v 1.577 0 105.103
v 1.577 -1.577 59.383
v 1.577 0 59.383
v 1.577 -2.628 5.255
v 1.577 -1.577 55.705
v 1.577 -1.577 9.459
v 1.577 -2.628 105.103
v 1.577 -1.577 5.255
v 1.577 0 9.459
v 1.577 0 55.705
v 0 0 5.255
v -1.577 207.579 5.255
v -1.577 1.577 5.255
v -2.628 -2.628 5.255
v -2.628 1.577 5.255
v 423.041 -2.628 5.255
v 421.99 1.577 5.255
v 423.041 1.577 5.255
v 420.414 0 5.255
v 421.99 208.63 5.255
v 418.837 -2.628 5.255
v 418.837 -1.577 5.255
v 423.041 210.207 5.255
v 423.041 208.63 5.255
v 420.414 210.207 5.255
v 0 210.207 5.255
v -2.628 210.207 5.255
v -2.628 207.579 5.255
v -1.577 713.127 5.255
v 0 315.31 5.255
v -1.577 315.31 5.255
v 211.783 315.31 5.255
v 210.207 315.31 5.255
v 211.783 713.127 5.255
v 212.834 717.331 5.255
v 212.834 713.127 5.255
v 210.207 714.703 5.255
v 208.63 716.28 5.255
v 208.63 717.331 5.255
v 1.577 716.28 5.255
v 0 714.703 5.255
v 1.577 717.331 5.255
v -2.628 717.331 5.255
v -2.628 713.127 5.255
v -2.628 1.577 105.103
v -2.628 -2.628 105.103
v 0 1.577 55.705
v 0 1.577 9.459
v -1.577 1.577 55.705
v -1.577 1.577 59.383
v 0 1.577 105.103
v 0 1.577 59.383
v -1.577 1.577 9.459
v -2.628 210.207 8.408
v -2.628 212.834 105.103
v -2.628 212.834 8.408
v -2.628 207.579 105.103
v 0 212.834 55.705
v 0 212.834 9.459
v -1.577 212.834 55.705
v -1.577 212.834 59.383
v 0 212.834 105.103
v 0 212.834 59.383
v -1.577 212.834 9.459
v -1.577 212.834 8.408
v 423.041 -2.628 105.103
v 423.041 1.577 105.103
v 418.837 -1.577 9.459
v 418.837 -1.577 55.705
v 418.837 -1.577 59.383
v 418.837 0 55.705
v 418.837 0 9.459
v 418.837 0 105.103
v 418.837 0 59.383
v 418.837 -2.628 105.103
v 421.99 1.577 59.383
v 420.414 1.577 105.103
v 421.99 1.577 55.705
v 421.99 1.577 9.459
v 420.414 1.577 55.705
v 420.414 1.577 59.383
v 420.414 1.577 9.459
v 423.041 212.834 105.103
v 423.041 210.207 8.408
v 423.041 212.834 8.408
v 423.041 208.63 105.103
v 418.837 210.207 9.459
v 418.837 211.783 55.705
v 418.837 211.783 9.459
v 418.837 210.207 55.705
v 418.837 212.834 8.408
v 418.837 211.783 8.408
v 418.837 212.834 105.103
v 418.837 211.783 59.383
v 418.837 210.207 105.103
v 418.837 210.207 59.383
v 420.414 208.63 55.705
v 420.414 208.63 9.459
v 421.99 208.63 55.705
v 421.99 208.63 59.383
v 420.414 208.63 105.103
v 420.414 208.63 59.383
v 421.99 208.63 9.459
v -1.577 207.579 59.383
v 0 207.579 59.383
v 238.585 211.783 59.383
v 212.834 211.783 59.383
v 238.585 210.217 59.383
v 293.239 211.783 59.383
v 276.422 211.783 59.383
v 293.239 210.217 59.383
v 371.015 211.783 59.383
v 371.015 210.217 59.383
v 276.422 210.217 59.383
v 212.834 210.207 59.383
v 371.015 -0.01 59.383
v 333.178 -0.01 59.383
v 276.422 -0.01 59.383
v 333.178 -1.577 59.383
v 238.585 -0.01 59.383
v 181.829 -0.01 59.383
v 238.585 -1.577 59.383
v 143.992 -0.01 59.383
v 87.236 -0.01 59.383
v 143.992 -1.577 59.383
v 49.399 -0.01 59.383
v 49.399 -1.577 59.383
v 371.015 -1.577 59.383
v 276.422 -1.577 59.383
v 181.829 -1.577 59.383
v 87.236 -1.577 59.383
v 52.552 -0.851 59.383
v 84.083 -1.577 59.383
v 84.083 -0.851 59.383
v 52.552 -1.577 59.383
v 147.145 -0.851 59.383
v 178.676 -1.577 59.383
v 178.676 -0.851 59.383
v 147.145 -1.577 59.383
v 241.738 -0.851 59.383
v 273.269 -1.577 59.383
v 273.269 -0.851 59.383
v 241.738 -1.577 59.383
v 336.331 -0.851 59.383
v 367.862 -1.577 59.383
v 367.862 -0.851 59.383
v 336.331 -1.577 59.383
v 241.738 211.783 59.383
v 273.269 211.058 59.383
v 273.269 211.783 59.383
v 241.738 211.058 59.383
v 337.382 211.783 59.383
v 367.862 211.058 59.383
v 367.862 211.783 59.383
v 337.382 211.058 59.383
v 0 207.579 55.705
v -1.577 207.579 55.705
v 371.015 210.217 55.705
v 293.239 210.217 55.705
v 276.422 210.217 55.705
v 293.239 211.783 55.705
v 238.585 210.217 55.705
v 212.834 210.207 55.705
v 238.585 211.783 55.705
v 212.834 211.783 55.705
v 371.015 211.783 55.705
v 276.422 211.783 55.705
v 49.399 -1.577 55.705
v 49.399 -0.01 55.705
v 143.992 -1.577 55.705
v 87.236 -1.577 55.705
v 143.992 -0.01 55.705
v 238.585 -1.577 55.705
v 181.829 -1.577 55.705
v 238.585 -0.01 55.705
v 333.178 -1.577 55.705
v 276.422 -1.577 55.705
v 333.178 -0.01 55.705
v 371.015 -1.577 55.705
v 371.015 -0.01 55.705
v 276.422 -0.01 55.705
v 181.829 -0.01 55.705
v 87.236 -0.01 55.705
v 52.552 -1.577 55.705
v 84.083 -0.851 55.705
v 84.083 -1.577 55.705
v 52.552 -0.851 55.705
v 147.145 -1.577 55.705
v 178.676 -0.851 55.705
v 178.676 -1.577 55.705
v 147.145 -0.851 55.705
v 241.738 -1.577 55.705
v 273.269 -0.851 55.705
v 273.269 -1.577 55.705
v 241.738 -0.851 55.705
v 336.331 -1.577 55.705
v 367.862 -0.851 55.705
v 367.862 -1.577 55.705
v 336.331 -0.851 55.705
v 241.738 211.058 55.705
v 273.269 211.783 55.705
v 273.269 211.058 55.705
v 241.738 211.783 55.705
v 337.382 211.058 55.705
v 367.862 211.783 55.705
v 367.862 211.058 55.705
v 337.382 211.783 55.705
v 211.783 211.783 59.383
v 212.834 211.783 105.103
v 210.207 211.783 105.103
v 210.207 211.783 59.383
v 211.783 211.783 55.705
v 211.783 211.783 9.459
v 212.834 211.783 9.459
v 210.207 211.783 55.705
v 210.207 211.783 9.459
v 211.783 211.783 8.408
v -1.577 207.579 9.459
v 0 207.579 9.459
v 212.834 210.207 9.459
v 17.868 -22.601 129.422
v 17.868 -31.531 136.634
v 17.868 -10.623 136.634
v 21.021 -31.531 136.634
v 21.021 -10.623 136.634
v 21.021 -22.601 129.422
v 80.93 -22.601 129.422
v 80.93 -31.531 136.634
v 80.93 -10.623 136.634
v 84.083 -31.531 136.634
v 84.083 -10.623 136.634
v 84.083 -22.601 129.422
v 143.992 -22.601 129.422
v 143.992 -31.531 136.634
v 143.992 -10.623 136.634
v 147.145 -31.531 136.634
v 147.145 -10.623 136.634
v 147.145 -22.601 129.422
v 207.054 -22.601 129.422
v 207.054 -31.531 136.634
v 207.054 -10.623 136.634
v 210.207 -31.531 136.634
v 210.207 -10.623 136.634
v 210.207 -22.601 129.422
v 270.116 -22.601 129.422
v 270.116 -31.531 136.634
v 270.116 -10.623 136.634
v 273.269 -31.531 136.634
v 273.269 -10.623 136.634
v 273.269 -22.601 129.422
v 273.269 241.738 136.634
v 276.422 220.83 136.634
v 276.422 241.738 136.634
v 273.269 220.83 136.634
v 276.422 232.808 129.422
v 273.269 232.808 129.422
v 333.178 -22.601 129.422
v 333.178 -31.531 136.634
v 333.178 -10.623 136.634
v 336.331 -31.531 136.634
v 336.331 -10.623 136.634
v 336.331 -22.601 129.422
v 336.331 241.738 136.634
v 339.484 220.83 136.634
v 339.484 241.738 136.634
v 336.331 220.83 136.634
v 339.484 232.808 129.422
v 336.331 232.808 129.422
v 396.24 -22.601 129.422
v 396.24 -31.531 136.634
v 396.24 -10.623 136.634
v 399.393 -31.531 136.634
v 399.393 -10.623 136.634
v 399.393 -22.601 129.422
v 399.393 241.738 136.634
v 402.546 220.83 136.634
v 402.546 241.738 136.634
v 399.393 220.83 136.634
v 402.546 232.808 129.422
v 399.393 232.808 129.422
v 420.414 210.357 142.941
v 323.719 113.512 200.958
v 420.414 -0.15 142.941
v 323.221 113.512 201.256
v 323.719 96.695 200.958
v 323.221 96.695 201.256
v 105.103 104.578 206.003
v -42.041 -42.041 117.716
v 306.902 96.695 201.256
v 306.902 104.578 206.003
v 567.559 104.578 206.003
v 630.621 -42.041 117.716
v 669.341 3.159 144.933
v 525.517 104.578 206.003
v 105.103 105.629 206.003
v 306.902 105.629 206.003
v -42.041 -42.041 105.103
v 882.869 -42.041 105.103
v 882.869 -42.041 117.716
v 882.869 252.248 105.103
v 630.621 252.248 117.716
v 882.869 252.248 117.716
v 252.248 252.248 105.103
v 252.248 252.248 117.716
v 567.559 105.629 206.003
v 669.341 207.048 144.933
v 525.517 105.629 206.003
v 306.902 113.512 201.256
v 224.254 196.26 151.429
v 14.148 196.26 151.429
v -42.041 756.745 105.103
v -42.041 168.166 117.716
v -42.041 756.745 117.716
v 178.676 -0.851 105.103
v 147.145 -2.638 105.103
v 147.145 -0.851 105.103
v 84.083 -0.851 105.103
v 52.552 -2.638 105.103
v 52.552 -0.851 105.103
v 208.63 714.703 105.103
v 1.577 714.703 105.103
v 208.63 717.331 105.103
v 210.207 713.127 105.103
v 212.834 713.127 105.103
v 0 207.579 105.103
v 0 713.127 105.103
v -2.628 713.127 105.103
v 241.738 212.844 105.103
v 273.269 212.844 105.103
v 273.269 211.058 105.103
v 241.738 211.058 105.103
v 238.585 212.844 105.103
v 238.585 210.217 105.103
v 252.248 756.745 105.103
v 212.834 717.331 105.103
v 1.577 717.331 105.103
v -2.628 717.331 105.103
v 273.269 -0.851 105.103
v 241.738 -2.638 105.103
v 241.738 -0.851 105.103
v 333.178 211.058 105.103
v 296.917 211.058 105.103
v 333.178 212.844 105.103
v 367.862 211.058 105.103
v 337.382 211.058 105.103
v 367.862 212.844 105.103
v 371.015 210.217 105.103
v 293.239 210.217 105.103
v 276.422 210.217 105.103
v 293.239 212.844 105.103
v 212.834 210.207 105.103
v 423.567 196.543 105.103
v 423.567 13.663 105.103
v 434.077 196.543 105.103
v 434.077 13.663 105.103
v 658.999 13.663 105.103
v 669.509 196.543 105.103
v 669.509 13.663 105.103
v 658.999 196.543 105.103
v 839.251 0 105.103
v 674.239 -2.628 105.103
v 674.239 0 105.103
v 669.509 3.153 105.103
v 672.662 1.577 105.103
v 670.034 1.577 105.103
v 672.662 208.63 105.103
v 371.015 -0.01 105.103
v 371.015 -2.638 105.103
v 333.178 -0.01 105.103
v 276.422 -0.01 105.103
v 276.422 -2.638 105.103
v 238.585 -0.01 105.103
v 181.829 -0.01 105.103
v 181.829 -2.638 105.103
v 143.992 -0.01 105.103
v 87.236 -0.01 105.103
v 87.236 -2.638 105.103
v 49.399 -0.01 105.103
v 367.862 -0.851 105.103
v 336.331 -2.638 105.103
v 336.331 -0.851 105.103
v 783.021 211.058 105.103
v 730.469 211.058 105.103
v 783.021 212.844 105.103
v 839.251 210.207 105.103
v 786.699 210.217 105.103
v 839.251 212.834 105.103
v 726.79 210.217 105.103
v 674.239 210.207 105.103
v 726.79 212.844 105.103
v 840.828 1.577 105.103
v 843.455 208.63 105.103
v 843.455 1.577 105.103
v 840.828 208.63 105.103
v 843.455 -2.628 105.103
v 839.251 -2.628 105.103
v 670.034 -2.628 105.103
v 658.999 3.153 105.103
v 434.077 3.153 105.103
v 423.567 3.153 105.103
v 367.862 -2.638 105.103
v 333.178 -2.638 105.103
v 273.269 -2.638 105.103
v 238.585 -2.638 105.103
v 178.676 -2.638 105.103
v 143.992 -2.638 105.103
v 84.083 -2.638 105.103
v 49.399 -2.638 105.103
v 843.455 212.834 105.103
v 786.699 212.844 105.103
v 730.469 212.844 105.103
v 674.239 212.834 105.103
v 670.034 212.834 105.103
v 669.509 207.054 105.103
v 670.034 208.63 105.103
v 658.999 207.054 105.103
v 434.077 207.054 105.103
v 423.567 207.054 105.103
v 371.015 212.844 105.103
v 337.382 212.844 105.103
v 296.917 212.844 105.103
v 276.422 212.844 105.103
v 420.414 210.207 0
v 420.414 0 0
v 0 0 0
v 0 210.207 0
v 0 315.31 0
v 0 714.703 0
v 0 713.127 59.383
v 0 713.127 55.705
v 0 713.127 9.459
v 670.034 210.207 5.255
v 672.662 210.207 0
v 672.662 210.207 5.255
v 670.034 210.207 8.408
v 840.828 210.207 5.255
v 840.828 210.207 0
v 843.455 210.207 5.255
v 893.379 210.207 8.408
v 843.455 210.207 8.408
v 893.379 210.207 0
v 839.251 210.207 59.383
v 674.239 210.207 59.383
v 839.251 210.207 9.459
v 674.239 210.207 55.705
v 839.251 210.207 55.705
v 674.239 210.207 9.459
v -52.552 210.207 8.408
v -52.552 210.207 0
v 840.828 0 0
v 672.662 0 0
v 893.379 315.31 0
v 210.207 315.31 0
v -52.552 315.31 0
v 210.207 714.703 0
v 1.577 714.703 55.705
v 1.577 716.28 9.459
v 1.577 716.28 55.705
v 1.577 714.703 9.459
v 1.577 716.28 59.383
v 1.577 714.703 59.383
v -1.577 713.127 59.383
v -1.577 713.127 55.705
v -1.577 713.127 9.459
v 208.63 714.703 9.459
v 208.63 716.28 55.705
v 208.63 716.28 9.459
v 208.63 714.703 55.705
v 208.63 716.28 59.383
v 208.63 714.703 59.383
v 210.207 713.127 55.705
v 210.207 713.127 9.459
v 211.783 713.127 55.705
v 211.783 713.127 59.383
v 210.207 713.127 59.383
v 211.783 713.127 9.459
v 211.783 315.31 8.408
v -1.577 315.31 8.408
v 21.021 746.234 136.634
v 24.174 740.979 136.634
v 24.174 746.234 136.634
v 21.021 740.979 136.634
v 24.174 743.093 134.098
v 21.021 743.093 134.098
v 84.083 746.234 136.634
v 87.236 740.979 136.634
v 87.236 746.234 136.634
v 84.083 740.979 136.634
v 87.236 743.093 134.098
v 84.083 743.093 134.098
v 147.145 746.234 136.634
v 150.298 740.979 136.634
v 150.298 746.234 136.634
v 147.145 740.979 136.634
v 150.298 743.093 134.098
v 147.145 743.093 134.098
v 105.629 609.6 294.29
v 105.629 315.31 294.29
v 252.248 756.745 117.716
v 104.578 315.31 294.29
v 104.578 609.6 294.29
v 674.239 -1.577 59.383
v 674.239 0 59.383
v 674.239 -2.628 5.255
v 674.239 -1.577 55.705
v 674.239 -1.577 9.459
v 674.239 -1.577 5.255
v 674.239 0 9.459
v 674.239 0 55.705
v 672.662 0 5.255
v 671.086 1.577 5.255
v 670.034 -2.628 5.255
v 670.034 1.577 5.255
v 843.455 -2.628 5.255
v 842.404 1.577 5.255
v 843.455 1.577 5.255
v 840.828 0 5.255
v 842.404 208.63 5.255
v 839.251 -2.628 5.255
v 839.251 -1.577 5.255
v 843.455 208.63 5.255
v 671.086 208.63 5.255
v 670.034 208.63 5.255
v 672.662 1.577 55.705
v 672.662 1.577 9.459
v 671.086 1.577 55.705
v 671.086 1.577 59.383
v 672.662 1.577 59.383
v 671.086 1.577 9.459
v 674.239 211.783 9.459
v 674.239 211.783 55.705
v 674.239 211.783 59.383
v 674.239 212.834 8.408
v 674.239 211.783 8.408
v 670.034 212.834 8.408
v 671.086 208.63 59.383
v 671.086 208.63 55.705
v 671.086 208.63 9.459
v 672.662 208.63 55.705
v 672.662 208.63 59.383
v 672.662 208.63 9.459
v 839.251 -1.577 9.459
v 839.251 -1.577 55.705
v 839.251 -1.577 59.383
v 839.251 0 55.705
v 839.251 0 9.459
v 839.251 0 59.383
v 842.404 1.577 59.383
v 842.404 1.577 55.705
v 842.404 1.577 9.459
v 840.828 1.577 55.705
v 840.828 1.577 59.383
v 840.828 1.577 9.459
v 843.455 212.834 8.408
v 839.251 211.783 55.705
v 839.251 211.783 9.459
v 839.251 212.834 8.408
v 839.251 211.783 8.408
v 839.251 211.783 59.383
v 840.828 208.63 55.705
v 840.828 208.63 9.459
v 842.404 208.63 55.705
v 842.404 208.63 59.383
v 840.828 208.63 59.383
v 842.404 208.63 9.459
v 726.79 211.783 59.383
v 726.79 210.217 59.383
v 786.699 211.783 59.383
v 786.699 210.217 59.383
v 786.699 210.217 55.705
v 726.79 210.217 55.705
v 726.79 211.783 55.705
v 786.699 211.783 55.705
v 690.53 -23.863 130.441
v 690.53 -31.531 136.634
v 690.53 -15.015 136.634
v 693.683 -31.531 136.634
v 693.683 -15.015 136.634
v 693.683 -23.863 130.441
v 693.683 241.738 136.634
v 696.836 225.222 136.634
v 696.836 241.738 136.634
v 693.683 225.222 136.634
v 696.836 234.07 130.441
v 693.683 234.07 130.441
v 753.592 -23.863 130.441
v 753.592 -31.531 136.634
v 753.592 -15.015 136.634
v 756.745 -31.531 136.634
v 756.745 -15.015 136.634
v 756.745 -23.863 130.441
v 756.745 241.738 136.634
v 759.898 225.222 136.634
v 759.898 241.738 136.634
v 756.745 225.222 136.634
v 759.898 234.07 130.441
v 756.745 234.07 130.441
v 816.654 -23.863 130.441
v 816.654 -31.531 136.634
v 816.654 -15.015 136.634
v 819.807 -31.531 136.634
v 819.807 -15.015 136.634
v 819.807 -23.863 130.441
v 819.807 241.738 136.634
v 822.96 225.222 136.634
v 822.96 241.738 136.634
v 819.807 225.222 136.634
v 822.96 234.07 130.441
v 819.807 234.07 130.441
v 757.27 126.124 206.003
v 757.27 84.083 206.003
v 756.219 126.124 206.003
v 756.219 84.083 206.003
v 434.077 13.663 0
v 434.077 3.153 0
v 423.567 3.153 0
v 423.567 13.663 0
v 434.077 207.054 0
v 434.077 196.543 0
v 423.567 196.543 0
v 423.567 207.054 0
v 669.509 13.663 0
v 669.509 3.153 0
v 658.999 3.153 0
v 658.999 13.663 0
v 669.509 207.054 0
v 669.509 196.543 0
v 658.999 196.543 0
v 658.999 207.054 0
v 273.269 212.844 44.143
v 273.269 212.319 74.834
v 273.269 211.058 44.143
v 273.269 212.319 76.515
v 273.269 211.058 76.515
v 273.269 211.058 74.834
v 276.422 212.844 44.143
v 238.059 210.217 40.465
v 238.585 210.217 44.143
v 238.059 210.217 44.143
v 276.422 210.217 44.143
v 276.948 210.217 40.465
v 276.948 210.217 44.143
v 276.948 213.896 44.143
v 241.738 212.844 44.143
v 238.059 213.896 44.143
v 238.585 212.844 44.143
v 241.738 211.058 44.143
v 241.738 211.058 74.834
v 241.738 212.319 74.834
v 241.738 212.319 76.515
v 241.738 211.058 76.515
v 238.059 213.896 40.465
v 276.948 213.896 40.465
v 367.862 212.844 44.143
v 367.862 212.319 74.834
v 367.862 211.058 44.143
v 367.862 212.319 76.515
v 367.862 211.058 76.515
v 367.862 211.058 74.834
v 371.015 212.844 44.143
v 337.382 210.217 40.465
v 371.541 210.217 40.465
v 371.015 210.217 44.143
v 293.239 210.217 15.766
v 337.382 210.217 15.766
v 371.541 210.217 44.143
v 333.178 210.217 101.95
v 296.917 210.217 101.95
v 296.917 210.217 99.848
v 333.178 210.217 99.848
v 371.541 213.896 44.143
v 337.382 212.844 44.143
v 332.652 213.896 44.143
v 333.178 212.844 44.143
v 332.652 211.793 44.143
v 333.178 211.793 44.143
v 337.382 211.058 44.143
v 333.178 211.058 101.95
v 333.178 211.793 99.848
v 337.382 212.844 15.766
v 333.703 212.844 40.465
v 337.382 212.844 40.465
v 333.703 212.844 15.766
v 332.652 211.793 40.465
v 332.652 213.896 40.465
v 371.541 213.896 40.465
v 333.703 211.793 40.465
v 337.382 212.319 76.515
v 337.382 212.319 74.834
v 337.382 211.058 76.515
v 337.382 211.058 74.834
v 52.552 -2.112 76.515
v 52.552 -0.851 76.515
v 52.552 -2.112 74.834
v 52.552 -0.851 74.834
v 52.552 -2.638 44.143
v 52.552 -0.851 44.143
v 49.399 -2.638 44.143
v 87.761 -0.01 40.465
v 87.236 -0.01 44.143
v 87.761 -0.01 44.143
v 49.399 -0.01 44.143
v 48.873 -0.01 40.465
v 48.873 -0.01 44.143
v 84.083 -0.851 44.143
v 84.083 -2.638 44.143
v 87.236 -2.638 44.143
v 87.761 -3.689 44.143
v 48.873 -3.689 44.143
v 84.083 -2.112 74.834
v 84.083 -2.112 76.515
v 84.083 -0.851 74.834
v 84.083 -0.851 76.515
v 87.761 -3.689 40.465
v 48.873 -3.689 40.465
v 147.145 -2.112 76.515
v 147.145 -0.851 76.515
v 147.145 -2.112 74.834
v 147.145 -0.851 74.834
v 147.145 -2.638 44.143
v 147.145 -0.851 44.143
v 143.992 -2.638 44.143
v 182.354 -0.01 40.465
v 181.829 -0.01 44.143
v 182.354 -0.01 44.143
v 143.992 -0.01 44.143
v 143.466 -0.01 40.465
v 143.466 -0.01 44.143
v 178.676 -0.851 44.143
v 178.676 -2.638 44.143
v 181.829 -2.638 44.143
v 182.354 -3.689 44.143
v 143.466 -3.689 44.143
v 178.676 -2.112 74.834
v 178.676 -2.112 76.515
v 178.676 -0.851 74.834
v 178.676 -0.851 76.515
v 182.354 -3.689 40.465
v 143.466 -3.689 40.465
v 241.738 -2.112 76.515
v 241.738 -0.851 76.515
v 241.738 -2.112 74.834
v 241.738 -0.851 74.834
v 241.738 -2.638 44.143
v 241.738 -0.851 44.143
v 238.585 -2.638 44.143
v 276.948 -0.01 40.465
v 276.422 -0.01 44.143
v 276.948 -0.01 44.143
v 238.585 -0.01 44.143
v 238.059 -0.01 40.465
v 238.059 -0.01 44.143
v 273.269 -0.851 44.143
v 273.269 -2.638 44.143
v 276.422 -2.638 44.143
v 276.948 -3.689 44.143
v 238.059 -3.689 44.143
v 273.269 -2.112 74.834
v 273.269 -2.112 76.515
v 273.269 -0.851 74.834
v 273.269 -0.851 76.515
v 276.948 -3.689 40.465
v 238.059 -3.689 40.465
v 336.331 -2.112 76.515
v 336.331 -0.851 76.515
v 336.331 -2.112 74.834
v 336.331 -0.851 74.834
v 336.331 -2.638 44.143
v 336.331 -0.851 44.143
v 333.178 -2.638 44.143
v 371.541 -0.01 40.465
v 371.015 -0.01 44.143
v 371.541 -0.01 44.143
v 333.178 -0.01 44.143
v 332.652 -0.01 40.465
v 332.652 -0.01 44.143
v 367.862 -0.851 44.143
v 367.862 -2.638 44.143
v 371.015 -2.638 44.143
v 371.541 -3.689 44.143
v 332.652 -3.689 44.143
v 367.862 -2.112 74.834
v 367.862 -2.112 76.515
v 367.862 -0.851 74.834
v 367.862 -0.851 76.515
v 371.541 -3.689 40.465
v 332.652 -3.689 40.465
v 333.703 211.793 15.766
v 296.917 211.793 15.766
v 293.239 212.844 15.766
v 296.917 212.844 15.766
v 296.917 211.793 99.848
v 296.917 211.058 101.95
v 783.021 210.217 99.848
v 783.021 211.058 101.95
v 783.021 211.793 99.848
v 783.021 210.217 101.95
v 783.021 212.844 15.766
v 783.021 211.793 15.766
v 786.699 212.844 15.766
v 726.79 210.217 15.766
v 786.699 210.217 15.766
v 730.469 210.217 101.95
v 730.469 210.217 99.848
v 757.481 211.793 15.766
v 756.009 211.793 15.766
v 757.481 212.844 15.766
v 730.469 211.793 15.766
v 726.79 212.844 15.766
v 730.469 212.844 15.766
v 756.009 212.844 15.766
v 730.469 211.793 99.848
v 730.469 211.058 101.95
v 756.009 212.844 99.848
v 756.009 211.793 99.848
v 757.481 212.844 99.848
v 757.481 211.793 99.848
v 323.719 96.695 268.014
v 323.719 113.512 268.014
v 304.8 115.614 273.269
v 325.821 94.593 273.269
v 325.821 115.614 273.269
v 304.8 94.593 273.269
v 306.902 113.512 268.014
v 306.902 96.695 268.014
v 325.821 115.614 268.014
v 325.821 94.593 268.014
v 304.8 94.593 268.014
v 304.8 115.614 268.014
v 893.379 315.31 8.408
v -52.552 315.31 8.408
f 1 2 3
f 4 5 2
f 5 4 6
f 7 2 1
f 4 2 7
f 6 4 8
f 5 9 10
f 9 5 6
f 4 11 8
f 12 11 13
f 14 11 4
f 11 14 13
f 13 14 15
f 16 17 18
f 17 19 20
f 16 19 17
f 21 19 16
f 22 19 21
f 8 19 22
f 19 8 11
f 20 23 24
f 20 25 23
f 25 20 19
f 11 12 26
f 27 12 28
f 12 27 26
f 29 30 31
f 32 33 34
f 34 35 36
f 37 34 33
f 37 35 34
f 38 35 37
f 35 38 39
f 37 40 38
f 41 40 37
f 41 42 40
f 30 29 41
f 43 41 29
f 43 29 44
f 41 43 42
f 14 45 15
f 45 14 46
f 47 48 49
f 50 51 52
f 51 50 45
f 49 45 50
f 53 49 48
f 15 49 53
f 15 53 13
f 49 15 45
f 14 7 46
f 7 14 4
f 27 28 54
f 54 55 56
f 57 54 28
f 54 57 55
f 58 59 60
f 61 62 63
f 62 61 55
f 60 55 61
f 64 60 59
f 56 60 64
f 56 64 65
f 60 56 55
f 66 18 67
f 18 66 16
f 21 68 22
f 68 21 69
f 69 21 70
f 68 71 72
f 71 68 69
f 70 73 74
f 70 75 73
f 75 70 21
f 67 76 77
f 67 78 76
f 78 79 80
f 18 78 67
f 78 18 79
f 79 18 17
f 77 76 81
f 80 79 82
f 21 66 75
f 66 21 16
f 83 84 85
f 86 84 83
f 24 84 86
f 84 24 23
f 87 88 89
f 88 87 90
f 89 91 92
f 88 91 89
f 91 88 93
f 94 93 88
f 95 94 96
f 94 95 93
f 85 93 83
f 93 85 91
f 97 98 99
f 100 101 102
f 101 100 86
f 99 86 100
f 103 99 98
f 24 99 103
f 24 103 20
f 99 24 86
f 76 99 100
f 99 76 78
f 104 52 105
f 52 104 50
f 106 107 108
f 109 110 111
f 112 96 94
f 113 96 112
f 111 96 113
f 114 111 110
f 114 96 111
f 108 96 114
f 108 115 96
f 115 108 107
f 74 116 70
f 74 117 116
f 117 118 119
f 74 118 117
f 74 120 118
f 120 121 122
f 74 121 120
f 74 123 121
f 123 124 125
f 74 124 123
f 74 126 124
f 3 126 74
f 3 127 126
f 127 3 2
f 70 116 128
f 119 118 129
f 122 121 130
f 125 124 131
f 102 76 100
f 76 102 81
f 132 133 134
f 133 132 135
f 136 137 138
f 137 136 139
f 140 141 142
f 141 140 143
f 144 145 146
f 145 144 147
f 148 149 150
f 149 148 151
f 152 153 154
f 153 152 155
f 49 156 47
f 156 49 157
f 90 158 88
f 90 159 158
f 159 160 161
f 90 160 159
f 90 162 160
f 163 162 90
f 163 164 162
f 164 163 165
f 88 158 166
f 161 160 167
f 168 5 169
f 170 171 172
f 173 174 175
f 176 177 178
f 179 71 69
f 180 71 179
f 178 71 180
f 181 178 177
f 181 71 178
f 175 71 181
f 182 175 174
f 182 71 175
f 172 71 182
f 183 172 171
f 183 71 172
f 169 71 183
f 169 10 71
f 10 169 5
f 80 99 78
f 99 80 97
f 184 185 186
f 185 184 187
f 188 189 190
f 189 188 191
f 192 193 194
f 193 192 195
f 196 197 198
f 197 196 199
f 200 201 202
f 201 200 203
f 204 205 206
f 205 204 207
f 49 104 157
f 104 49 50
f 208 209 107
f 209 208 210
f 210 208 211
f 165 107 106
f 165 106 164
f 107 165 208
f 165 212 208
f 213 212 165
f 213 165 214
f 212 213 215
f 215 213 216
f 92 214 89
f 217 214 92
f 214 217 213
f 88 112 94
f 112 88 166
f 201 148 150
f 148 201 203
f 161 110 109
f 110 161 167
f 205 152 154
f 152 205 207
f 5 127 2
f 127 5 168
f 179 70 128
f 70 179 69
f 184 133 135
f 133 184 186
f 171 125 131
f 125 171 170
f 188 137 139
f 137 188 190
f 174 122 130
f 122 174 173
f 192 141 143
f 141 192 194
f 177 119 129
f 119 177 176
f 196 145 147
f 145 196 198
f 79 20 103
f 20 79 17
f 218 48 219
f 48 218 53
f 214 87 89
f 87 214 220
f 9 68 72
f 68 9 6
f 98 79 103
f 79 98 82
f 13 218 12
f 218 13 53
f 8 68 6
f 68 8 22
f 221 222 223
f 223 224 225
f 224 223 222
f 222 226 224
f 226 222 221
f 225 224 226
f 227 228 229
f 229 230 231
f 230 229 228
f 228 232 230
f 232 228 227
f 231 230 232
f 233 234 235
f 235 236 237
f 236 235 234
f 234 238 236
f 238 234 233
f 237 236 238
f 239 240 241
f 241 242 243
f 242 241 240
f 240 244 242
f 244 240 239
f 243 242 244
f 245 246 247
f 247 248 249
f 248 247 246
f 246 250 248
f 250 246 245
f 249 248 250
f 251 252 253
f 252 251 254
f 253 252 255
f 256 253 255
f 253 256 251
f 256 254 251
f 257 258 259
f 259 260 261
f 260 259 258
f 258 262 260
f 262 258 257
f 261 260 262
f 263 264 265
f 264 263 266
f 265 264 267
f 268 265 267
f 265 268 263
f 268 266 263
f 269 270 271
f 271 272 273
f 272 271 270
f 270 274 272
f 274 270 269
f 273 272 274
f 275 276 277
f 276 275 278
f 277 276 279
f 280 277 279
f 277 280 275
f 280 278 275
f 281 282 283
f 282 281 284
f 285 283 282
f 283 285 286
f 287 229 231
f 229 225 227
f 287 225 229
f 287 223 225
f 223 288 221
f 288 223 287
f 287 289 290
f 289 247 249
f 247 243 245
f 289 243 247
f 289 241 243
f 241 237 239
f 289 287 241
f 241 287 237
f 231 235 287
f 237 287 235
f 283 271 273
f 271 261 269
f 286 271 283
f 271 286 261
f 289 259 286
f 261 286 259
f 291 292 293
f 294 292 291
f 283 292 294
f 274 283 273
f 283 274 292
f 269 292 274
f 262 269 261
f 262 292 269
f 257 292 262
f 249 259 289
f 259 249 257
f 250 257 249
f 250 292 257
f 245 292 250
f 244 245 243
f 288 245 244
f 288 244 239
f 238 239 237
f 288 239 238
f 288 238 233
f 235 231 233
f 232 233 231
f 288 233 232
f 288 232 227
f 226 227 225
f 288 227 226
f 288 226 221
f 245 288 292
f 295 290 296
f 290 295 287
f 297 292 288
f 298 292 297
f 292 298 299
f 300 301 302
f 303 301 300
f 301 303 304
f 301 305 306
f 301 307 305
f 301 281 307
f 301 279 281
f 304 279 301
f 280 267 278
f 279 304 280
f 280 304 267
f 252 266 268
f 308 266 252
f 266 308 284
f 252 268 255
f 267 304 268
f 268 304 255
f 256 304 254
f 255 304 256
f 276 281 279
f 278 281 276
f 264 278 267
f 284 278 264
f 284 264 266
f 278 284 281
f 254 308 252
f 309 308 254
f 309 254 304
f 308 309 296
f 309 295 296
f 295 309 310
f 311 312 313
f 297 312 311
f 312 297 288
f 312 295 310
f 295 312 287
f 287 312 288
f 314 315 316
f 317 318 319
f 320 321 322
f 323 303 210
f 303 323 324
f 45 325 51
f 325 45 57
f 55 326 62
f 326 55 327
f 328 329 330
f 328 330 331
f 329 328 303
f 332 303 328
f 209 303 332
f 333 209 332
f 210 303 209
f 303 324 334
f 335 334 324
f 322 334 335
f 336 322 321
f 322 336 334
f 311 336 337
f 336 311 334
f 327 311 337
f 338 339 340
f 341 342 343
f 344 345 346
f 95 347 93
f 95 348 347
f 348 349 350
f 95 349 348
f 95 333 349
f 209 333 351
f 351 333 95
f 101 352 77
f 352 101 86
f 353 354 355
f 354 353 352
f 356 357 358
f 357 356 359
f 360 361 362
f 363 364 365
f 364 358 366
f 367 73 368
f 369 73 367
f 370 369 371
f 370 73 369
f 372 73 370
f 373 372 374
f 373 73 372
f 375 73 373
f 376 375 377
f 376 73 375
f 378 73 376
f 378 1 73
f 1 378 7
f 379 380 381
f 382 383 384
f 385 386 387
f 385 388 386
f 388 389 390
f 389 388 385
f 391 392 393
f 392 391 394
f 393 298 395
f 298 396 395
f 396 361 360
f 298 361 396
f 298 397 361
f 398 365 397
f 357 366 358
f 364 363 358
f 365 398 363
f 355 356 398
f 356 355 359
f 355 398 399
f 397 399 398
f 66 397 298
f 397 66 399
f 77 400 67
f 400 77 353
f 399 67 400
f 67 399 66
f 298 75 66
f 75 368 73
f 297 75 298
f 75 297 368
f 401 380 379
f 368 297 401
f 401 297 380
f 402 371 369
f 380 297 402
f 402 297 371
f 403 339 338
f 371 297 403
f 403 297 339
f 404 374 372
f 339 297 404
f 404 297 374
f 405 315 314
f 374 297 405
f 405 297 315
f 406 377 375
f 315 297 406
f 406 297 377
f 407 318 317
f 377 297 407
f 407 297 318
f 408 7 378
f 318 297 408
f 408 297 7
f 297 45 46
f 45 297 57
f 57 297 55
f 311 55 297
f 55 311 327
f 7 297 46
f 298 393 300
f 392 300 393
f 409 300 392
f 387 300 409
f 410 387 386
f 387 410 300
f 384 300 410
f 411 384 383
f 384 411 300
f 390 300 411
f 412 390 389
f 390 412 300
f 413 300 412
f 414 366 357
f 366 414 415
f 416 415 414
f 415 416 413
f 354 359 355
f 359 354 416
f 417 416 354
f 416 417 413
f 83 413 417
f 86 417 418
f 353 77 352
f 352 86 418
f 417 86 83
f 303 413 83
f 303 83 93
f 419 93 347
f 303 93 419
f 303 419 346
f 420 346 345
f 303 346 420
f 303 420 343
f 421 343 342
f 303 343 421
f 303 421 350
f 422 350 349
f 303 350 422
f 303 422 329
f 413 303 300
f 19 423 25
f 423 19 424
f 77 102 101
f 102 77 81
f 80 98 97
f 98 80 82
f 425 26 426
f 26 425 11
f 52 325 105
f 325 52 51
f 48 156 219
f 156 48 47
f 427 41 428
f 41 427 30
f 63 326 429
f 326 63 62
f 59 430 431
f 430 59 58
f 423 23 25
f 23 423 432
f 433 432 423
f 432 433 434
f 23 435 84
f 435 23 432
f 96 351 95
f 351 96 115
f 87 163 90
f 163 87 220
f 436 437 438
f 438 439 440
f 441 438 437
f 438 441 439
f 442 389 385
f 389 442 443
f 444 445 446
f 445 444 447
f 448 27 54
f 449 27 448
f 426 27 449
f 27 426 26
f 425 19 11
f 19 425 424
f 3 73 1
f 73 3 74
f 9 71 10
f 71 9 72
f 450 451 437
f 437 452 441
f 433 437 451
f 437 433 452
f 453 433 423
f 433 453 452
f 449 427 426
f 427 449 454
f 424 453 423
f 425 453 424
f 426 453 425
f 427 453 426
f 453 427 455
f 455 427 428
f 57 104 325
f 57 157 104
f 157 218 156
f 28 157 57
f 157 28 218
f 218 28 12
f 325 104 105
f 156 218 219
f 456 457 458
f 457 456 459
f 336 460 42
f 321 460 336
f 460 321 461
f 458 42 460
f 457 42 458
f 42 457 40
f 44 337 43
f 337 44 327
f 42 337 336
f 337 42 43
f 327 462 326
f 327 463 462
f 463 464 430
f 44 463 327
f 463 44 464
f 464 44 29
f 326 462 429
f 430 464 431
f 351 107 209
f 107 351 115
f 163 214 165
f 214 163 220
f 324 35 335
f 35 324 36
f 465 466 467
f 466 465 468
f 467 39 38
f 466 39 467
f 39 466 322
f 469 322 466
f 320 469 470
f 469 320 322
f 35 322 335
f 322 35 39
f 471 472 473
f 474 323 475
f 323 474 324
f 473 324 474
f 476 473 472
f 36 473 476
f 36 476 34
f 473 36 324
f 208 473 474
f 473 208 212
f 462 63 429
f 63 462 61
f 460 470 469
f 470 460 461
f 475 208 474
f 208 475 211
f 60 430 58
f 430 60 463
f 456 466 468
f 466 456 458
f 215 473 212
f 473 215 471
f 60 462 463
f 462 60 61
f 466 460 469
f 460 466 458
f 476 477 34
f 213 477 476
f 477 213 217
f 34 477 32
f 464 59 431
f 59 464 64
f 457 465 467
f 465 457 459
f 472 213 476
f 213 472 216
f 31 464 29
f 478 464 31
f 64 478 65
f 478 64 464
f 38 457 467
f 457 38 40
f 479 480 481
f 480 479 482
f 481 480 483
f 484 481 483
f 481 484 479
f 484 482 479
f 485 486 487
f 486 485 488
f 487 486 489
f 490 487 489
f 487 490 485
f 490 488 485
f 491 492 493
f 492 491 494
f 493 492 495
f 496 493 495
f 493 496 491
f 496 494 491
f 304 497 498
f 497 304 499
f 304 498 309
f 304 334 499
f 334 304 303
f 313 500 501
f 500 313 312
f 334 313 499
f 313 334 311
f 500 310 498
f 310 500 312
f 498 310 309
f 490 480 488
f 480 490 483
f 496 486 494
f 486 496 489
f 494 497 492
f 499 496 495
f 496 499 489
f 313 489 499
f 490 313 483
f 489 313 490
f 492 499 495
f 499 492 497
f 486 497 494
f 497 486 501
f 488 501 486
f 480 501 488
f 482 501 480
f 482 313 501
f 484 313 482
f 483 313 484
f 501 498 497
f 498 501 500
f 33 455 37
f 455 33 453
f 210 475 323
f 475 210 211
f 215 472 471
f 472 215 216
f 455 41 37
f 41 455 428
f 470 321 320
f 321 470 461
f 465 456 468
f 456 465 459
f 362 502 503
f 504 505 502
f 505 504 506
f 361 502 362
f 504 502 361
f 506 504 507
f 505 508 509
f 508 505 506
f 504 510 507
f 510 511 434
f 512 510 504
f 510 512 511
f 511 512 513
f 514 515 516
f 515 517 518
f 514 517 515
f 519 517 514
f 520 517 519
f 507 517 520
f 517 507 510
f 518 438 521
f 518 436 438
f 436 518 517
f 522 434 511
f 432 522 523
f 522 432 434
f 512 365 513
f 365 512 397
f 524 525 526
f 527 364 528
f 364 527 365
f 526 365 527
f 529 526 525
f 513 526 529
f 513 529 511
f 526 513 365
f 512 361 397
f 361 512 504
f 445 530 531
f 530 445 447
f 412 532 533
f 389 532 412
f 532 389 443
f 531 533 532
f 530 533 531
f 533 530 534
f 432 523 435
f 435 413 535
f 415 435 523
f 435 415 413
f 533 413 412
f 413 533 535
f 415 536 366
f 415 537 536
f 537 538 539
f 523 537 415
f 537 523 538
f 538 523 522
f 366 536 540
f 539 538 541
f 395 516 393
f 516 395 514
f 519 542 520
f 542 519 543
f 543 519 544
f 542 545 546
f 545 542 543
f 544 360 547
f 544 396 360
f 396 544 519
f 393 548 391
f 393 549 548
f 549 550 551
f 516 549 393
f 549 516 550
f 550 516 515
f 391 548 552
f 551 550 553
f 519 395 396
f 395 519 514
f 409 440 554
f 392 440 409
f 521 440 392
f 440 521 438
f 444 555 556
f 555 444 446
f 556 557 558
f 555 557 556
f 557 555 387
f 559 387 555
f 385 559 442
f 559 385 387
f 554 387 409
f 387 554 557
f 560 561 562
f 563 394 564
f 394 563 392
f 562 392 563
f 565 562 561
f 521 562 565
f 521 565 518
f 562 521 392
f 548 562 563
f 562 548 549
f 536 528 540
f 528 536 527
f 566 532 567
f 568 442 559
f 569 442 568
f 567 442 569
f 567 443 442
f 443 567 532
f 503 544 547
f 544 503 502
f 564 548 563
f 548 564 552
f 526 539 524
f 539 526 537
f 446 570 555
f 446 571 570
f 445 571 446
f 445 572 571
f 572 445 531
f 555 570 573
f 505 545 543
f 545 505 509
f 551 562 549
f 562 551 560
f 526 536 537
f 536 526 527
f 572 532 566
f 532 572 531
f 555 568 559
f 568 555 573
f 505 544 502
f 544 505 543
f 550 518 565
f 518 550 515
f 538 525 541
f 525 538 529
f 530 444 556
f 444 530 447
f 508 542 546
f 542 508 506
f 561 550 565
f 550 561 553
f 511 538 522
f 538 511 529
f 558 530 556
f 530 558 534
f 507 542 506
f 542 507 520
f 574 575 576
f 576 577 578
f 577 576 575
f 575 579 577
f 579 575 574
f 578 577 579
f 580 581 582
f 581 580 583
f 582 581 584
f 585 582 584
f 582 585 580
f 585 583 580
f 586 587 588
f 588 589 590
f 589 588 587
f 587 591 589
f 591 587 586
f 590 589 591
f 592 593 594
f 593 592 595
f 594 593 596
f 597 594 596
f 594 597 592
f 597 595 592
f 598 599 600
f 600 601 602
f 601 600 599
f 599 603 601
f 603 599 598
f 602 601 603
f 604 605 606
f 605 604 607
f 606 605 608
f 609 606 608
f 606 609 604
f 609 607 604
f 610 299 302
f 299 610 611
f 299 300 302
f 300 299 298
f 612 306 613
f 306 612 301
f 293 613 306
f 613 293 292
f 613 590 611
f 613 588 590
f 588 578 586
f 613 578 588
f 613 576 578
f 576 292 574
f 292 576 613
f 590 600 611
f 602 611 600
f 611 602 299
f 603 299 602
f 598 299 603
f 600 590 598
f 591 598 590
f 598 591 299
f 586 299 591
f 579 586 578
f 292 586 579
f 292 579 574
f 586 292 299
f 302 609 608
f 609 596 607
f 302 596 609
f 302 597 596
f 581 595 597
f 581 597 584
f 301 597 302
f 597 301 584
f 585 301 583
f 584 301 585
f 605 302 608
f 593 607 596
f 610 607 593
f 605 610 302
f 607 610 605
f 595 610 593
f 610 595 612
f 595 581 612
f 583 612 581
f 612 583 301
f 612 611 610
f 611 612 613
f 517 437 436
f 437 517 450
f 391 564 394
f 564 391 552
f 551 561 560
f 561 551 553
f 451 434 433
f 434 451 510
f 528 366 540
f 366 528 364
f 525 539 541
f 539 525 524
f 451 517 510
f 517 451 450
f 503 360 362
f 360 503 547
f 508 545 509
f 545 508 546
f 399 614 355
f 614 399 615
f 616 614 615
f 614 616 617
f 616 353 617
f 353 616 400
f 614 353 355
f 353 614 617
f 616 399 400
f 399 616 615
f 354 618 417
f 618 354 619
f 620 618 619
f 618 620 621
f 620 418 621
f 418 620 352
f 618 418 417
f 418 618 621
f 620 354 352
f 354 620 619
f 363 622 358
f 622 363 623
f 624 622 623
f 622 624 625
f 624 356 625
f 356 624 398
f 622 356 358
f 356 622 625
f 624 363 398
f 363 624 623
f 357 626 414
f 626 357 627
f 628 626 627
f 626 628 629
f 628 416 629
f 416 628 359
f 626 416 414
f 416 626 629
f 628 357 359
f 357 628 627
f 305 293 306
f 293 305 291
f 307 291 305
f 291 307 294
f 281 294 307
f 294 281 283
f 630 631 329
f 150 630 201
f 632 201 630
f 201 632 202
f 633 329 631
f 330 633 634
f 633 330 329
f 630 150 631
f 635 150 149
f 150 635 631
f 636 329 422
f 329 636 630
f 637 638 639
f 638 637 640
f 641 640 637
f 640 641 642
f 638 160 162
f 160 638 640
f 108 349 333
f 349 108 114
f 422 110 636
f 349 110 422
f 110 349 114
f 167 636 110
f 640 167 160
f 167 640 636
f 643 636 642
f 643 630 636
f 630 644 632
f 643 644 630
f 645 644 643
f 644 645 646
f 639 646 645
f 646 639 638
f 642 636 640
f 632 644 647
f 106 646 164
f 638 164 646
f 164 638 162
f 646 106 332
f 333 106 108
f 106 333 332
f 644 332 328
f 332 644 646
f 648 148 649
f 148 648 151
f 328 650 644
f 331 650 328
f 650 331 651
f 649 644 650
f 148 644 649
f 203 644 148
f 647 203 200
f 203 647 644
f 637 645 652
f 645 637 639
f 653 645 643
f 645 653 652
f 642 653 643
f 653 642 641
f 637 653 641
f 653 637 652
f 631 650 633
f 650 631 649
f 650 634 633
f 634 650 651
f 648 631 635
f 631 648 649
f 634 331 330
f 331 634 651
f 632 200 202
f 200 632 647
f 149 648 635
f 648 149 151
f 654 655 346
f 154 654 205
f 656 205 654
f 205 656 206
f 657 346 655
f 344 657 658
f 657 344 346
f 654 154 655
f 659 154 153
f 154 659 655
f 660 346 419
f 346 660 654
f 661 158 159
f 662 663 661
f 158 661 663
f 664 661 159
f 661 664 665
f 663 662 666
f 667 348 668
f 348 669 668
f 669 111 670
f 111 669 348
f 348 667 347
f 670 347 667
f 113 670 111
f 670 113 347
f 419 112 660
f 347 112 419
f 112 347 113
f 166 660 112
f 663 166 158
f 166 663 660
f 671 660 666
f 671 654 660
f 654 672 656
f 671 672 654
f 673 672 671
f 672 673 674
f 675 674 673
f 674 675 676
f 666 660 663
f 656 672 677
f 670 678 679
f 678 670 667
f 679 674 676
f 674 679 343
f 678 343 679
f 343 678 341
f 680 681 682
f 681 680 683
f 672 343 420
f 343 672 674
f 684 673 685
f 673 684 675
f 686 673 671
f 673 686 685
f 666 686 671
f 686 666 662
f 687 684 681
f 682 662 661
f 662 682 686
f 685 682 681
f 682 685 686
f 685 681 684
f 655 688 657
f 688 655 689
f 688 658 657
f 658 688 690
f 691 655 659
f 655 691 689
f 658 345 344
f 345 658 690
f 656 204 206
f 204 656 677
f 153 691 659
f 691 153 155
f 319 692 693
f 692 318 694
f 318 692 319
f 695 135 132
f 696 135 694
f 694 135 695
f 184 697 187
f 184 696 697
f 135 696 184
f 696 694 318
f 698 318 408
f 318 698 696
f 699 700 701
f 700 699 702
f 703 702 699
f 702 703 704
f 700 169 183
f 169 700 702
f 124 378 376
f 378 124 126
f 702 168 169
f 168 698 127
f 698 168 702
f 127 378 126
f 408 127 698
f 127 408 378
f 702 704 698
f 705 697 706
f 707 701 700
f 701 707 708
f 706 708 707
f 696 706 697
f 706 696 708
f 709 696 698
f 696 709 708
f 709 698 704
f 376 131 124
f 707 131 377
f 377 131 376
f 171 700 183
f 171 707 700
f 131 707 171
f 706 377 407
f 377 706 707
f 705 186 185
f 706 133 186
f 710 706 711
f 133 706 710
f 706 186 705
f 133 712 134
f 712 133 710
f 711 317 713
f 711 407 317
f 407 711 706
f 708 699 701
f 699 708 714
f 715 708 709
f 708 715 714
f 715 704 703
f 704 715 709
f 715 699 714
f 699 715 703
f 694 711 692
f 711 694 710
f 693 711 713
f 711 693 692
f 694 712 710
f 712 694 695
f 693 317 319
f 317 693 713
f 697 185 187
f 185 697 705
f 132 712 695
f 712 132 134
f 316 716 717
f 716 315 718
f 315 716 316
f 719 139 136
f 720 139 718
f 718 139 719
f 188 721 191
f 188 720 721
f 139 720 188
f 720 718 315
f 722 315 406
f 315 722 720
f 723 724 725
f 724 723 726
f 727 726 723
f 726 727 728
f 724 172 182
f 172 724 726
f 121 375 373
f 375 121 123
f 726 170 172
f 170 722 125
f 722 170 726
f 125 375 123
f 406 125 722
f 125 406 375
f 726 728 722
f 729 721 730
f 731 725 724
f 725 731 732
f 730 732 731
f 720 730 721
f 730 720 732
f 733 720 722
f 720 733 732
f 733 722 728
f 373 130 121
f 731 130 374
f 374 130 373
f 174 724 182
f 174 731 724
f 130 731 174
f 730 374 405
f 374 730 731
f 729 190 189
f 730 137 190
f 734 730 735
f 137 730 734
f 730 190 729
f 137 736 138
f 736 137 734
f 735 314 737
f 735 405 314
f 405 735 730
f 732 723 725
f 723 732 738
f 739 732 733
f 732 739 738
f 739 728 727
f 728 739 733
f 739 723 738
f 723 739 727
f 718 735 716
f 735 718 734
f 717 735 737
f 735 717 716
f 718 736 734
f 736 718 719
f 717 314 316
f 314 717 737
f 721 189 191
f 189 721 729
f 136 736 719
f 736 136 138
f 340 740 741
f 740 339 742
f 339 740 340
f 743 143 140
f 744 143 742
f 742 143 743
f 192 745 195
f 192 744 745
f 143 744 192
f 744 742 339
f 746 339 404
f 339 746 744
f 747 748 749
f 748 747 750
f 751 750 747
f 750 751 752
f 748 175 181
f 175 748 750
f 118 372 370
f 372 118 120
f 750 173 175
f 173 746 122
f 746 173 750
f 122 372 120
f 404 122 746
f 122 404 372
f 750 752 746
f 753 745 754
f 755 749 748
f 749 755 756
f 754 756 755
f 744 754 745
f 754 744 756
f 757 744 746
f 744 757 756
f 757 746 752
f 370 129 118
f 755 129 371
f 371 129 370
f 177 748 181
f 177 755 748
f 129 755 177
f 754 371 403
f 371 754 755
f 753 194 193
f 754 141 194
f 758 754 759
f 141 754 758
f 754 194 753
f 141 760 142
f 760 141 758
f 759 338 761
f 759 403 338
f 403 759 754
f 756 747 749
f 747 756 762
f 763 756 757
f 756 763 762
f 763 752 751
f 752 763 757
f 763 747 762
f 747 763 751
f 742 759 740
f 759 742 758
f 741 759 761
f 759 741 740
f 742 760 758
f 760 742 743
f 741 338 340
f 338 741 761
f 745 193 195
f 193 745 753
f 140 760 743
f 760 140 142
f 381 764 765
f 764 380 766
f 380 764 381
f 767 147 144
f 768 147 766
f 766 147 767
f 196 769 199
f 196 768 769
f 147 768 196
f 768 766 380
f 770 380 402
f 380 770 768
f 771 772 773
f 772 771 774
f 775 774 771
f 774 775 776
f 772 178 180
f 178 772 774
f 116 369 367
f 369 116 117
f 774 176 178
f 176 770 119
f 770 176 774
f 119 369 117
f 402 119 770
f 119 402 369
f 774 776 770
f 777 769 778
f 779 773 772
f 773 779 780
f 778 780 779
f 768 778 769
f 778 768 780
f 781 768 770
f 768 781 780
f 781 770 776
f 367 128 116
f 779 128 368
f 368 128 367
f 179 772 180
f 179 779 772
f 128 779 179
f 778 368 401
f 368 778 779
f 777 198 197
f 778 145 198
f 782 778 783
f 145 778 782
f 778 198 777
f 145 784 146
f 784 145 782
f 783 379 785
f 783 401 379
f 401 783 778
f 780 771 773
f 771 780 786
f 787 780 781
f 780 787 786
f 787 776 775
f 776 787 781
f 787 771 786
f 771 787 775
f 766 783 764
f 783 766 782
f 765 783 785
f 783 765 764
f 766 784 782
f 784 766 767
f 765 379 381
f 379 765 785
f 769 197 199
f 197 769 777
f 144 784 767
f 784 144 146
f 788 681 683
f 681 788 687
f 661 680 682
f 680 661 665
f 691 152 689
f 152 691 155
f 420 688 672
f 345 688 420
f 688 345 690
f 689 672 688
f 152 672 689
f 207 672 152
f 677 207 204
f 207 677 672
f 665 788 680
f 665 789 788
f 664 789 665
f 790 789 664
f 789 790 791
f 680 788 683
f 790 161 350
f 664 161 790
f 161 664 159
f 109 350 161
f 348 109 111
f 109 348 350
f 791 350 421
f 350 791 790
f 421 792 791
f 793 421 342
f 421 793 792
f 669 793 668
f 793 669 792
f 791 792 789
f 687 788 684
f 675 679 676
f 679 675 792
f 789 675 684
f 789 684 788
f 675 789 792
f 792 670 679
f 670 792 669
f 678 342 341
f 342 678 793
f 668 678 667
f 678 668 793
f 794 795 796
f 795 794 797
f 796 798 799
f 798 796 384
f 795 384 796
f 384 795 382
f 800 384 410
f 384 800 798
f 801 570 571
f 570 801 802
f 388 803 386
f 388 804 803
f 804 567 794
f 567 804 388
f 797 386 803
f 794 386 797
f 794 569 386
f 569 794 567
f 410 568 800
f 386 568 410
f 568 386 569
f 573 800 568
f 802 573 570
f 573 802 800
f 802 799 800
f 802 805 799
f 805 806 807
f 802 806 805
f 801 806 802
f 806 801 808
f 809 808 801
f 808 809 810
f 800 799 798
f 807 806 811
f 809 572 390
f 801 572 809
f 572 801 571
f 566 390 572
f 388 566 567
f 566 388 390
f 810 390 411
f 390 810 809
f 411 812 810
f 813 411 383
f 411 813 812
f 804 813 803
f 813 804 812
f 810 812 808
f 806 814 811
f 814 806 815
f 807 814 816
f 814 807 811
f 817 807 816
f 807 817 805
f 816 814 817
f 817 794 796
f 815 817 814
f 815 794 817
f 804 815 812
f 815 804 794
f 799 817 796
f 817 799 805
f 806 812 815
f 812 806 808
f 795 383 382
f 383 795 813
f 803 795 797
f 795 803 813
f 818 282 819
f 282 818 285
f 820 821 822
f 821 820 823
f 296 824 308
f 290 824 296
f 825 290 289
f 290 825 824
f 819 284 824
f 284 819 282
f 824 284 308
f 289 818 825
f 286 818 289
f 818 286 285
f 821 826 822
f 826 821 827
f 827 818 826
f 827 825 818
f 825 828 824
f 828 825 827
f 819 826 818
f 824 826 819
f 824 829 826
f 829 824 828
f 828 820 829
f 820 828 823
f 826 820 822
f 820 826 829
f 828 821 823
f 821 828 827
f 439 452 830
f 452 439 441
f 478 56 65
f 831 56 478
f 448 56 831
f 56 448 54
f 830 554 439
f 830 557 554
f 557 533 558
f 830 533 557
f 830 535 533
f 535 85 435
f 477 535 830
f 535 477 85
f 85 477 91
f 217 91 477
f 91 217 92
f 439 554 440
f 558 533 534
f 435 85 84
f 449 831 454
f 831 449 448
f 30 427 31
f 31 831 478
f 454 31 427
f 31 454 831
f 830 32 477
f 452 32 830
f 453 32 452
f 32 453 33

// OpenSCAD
// =====================================================================
//  MILWAUKEE ROAD - CORLISS (STURTEVANT), WIS. JUNCTION DEPOT
//  Source: Album sheet 39, drawing A-725, May 16 1901 (J. U. Nettenstrom).  Drawings are private reference (in copyright):
//  Research Library / RSW / Stations / Standard depots / Album of Depot Plans 1919.
//  Rib Side Works, 24 Nov 2026. FIRST SHAPE MODEL for review - not cut into print sections.
//  KNOWN (from the sheet): 68 x 68 ft L at the junction of two lines: smoking 15 x 19, general waiting 27 x 27 with octagonal office bay 15 x 15, two 24 and 20 ft pavilions, baggage 15 x 19; tall conical turret over the office, cresting.
//  ESTIMATE: wall and ridge heights where not written, window count and spacing, colours.
//  Built with the shared depot builder ../../../_common/rsw_depot.scad (x along the track,
//  y = 0 town side, track side +y, feet).  SCALE: 29 = G, 48 = O, 87 = HO.
// =====================================================================
SCALE = 29;
include <../../../_common/rsw_depot.scad>
// COLOURS measured from photos 24 Nov 2026: railpictures.net (Greg Mross) colour photo at Sturtevant, Milwaukee Road era, evening light corrected using the cream door as white. Tan-brown siding, cream window and door trim, dark grey shingles. (Painted white later, mustard yellow at Caledonia since 2010.)
COL_BODY = "#B08866";
COL_TRIM = "#5E4535";
COL_SASH = "#E6DFCC";
COL_DOOR = "#E6DFCC";
COL_ROOF = "#3E3A3C";

depot(blocks = [[0, 40, 0, 20, 13, 0.6, 0, 4, 0], [0, 20, 20, 48, 13, 0.6, 0, 4, 0], [64, 16, 0, 20, 13, 0.6, 0, 4, 0]],
      pavs   = [[40, 24, 0, 20, 13, 0.6, 0, 4, 2, 2]],
      wins   = [[6.5, 1, 3, 6, 4.2], [15.5, 1, 3, 6, 4.2], [24.5, 1, 3, 6, 4.2], [33.5, 1, 3, 6, 4.2], [6.5, 0, 3, 6, 4.2], [15.5, 0, 3, 6, 4.2], [24.5, 0, 3, 6, 4.2], [33.5, 0, 3, 6, 4.2]],
      doors  = [[30, 1, 3.5, 8, 0], [72, 1, 5, 8, 1, 2]],
      bays   = [],
      chims  = [[30, 10, 26]],
      plat   = [-5, 90, 10, 0.8]);
